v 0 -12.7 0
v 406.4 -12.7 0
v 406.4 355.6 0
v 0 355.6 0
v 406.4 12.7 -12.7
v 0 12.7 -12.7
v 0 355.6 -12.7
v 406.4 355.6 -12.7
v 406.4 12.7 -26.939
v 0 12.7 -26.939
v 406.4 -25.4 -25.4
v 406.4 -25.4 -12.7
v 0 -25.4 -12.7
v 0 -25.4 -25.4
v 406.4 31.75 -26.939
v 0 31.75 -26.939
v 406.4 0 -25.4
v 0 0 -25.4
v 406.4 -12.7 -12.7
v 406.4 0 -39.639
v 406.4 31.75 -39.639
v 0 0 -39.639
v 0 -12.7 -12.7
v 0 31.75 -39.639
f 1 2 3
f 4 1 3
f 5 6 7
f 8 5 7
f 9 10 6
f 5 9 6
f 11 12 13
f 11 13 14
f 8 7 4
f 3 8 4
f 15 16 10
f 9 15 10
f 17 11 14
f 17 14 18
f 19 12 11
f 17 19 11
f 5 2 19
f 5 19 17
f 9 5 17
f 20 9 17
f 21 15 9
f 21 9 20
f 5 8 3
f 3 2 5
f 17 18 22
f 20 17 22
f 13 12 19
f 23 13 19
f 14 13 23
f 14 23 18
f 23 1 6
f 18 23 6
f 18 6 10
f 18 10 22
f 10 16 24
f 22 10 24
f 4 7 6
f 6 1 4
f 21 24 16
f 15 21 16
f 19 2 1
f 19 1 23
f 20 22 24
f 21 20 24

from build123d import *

# Parameters (mm, degrees)
BOSS_EXTRUDE1_DEPTH = 406.4
SKETCH3_W           = 12.7
SKETCH3_H           = 12.7
BOSS_EXTRUDE2_DEPTH = 406.4
SKETCH4_W           = 12.7
SKETCH4_H           = 25.4
BOSS_EXTRUDE3_DEPTH = 406.4


with BuildPart() as part:
    # Sketch2 → Boss-Extrude1 (new body)
    with BuildSketch(Plane(origin=(0, 0, 0), x_dir=(0, 0, -1), z_dir=(1, 0, 0))):
        Polygon((0, 0), (39.639393939, 0), (39.639393939, 31.75), (26.939393939, 31.75), (26.939393939, 12.7), (12.7, 12.7), (12.7, 355.6), (0, 355.6), align=None)
    extrude(amount=BOSS_EXTRUDE1_DEPTH)

    # Sketch3 → Boss-Extrude2 (add)
    with BuildSketch(Plane(origin=(406.4, 0, 0), x_dir=(0, 0, -1), z_dir=(1, 0, 0))):
        with Locations((6.35, -6.35)):
            Rectangle(SKETCH3_W, SKETCH3_H)
    extrude(amount=-BOSS_EXTRUDE2_DEPTH)

    # Sketch4 → Boss-Extrude3 (add)
    with BuildSketch(Plane(origin=(406.4, 0, 0), x_dir=(0, 0, -1), z_dir=(1, 0, 0))):
        with Locations((19.05, -12.7)):
            Rectangle(SKETCH4_W, SKETCH4_H)
    extrude(amount=-BOSS_EXTRUDE3_DEPTH)


solid = part.part
